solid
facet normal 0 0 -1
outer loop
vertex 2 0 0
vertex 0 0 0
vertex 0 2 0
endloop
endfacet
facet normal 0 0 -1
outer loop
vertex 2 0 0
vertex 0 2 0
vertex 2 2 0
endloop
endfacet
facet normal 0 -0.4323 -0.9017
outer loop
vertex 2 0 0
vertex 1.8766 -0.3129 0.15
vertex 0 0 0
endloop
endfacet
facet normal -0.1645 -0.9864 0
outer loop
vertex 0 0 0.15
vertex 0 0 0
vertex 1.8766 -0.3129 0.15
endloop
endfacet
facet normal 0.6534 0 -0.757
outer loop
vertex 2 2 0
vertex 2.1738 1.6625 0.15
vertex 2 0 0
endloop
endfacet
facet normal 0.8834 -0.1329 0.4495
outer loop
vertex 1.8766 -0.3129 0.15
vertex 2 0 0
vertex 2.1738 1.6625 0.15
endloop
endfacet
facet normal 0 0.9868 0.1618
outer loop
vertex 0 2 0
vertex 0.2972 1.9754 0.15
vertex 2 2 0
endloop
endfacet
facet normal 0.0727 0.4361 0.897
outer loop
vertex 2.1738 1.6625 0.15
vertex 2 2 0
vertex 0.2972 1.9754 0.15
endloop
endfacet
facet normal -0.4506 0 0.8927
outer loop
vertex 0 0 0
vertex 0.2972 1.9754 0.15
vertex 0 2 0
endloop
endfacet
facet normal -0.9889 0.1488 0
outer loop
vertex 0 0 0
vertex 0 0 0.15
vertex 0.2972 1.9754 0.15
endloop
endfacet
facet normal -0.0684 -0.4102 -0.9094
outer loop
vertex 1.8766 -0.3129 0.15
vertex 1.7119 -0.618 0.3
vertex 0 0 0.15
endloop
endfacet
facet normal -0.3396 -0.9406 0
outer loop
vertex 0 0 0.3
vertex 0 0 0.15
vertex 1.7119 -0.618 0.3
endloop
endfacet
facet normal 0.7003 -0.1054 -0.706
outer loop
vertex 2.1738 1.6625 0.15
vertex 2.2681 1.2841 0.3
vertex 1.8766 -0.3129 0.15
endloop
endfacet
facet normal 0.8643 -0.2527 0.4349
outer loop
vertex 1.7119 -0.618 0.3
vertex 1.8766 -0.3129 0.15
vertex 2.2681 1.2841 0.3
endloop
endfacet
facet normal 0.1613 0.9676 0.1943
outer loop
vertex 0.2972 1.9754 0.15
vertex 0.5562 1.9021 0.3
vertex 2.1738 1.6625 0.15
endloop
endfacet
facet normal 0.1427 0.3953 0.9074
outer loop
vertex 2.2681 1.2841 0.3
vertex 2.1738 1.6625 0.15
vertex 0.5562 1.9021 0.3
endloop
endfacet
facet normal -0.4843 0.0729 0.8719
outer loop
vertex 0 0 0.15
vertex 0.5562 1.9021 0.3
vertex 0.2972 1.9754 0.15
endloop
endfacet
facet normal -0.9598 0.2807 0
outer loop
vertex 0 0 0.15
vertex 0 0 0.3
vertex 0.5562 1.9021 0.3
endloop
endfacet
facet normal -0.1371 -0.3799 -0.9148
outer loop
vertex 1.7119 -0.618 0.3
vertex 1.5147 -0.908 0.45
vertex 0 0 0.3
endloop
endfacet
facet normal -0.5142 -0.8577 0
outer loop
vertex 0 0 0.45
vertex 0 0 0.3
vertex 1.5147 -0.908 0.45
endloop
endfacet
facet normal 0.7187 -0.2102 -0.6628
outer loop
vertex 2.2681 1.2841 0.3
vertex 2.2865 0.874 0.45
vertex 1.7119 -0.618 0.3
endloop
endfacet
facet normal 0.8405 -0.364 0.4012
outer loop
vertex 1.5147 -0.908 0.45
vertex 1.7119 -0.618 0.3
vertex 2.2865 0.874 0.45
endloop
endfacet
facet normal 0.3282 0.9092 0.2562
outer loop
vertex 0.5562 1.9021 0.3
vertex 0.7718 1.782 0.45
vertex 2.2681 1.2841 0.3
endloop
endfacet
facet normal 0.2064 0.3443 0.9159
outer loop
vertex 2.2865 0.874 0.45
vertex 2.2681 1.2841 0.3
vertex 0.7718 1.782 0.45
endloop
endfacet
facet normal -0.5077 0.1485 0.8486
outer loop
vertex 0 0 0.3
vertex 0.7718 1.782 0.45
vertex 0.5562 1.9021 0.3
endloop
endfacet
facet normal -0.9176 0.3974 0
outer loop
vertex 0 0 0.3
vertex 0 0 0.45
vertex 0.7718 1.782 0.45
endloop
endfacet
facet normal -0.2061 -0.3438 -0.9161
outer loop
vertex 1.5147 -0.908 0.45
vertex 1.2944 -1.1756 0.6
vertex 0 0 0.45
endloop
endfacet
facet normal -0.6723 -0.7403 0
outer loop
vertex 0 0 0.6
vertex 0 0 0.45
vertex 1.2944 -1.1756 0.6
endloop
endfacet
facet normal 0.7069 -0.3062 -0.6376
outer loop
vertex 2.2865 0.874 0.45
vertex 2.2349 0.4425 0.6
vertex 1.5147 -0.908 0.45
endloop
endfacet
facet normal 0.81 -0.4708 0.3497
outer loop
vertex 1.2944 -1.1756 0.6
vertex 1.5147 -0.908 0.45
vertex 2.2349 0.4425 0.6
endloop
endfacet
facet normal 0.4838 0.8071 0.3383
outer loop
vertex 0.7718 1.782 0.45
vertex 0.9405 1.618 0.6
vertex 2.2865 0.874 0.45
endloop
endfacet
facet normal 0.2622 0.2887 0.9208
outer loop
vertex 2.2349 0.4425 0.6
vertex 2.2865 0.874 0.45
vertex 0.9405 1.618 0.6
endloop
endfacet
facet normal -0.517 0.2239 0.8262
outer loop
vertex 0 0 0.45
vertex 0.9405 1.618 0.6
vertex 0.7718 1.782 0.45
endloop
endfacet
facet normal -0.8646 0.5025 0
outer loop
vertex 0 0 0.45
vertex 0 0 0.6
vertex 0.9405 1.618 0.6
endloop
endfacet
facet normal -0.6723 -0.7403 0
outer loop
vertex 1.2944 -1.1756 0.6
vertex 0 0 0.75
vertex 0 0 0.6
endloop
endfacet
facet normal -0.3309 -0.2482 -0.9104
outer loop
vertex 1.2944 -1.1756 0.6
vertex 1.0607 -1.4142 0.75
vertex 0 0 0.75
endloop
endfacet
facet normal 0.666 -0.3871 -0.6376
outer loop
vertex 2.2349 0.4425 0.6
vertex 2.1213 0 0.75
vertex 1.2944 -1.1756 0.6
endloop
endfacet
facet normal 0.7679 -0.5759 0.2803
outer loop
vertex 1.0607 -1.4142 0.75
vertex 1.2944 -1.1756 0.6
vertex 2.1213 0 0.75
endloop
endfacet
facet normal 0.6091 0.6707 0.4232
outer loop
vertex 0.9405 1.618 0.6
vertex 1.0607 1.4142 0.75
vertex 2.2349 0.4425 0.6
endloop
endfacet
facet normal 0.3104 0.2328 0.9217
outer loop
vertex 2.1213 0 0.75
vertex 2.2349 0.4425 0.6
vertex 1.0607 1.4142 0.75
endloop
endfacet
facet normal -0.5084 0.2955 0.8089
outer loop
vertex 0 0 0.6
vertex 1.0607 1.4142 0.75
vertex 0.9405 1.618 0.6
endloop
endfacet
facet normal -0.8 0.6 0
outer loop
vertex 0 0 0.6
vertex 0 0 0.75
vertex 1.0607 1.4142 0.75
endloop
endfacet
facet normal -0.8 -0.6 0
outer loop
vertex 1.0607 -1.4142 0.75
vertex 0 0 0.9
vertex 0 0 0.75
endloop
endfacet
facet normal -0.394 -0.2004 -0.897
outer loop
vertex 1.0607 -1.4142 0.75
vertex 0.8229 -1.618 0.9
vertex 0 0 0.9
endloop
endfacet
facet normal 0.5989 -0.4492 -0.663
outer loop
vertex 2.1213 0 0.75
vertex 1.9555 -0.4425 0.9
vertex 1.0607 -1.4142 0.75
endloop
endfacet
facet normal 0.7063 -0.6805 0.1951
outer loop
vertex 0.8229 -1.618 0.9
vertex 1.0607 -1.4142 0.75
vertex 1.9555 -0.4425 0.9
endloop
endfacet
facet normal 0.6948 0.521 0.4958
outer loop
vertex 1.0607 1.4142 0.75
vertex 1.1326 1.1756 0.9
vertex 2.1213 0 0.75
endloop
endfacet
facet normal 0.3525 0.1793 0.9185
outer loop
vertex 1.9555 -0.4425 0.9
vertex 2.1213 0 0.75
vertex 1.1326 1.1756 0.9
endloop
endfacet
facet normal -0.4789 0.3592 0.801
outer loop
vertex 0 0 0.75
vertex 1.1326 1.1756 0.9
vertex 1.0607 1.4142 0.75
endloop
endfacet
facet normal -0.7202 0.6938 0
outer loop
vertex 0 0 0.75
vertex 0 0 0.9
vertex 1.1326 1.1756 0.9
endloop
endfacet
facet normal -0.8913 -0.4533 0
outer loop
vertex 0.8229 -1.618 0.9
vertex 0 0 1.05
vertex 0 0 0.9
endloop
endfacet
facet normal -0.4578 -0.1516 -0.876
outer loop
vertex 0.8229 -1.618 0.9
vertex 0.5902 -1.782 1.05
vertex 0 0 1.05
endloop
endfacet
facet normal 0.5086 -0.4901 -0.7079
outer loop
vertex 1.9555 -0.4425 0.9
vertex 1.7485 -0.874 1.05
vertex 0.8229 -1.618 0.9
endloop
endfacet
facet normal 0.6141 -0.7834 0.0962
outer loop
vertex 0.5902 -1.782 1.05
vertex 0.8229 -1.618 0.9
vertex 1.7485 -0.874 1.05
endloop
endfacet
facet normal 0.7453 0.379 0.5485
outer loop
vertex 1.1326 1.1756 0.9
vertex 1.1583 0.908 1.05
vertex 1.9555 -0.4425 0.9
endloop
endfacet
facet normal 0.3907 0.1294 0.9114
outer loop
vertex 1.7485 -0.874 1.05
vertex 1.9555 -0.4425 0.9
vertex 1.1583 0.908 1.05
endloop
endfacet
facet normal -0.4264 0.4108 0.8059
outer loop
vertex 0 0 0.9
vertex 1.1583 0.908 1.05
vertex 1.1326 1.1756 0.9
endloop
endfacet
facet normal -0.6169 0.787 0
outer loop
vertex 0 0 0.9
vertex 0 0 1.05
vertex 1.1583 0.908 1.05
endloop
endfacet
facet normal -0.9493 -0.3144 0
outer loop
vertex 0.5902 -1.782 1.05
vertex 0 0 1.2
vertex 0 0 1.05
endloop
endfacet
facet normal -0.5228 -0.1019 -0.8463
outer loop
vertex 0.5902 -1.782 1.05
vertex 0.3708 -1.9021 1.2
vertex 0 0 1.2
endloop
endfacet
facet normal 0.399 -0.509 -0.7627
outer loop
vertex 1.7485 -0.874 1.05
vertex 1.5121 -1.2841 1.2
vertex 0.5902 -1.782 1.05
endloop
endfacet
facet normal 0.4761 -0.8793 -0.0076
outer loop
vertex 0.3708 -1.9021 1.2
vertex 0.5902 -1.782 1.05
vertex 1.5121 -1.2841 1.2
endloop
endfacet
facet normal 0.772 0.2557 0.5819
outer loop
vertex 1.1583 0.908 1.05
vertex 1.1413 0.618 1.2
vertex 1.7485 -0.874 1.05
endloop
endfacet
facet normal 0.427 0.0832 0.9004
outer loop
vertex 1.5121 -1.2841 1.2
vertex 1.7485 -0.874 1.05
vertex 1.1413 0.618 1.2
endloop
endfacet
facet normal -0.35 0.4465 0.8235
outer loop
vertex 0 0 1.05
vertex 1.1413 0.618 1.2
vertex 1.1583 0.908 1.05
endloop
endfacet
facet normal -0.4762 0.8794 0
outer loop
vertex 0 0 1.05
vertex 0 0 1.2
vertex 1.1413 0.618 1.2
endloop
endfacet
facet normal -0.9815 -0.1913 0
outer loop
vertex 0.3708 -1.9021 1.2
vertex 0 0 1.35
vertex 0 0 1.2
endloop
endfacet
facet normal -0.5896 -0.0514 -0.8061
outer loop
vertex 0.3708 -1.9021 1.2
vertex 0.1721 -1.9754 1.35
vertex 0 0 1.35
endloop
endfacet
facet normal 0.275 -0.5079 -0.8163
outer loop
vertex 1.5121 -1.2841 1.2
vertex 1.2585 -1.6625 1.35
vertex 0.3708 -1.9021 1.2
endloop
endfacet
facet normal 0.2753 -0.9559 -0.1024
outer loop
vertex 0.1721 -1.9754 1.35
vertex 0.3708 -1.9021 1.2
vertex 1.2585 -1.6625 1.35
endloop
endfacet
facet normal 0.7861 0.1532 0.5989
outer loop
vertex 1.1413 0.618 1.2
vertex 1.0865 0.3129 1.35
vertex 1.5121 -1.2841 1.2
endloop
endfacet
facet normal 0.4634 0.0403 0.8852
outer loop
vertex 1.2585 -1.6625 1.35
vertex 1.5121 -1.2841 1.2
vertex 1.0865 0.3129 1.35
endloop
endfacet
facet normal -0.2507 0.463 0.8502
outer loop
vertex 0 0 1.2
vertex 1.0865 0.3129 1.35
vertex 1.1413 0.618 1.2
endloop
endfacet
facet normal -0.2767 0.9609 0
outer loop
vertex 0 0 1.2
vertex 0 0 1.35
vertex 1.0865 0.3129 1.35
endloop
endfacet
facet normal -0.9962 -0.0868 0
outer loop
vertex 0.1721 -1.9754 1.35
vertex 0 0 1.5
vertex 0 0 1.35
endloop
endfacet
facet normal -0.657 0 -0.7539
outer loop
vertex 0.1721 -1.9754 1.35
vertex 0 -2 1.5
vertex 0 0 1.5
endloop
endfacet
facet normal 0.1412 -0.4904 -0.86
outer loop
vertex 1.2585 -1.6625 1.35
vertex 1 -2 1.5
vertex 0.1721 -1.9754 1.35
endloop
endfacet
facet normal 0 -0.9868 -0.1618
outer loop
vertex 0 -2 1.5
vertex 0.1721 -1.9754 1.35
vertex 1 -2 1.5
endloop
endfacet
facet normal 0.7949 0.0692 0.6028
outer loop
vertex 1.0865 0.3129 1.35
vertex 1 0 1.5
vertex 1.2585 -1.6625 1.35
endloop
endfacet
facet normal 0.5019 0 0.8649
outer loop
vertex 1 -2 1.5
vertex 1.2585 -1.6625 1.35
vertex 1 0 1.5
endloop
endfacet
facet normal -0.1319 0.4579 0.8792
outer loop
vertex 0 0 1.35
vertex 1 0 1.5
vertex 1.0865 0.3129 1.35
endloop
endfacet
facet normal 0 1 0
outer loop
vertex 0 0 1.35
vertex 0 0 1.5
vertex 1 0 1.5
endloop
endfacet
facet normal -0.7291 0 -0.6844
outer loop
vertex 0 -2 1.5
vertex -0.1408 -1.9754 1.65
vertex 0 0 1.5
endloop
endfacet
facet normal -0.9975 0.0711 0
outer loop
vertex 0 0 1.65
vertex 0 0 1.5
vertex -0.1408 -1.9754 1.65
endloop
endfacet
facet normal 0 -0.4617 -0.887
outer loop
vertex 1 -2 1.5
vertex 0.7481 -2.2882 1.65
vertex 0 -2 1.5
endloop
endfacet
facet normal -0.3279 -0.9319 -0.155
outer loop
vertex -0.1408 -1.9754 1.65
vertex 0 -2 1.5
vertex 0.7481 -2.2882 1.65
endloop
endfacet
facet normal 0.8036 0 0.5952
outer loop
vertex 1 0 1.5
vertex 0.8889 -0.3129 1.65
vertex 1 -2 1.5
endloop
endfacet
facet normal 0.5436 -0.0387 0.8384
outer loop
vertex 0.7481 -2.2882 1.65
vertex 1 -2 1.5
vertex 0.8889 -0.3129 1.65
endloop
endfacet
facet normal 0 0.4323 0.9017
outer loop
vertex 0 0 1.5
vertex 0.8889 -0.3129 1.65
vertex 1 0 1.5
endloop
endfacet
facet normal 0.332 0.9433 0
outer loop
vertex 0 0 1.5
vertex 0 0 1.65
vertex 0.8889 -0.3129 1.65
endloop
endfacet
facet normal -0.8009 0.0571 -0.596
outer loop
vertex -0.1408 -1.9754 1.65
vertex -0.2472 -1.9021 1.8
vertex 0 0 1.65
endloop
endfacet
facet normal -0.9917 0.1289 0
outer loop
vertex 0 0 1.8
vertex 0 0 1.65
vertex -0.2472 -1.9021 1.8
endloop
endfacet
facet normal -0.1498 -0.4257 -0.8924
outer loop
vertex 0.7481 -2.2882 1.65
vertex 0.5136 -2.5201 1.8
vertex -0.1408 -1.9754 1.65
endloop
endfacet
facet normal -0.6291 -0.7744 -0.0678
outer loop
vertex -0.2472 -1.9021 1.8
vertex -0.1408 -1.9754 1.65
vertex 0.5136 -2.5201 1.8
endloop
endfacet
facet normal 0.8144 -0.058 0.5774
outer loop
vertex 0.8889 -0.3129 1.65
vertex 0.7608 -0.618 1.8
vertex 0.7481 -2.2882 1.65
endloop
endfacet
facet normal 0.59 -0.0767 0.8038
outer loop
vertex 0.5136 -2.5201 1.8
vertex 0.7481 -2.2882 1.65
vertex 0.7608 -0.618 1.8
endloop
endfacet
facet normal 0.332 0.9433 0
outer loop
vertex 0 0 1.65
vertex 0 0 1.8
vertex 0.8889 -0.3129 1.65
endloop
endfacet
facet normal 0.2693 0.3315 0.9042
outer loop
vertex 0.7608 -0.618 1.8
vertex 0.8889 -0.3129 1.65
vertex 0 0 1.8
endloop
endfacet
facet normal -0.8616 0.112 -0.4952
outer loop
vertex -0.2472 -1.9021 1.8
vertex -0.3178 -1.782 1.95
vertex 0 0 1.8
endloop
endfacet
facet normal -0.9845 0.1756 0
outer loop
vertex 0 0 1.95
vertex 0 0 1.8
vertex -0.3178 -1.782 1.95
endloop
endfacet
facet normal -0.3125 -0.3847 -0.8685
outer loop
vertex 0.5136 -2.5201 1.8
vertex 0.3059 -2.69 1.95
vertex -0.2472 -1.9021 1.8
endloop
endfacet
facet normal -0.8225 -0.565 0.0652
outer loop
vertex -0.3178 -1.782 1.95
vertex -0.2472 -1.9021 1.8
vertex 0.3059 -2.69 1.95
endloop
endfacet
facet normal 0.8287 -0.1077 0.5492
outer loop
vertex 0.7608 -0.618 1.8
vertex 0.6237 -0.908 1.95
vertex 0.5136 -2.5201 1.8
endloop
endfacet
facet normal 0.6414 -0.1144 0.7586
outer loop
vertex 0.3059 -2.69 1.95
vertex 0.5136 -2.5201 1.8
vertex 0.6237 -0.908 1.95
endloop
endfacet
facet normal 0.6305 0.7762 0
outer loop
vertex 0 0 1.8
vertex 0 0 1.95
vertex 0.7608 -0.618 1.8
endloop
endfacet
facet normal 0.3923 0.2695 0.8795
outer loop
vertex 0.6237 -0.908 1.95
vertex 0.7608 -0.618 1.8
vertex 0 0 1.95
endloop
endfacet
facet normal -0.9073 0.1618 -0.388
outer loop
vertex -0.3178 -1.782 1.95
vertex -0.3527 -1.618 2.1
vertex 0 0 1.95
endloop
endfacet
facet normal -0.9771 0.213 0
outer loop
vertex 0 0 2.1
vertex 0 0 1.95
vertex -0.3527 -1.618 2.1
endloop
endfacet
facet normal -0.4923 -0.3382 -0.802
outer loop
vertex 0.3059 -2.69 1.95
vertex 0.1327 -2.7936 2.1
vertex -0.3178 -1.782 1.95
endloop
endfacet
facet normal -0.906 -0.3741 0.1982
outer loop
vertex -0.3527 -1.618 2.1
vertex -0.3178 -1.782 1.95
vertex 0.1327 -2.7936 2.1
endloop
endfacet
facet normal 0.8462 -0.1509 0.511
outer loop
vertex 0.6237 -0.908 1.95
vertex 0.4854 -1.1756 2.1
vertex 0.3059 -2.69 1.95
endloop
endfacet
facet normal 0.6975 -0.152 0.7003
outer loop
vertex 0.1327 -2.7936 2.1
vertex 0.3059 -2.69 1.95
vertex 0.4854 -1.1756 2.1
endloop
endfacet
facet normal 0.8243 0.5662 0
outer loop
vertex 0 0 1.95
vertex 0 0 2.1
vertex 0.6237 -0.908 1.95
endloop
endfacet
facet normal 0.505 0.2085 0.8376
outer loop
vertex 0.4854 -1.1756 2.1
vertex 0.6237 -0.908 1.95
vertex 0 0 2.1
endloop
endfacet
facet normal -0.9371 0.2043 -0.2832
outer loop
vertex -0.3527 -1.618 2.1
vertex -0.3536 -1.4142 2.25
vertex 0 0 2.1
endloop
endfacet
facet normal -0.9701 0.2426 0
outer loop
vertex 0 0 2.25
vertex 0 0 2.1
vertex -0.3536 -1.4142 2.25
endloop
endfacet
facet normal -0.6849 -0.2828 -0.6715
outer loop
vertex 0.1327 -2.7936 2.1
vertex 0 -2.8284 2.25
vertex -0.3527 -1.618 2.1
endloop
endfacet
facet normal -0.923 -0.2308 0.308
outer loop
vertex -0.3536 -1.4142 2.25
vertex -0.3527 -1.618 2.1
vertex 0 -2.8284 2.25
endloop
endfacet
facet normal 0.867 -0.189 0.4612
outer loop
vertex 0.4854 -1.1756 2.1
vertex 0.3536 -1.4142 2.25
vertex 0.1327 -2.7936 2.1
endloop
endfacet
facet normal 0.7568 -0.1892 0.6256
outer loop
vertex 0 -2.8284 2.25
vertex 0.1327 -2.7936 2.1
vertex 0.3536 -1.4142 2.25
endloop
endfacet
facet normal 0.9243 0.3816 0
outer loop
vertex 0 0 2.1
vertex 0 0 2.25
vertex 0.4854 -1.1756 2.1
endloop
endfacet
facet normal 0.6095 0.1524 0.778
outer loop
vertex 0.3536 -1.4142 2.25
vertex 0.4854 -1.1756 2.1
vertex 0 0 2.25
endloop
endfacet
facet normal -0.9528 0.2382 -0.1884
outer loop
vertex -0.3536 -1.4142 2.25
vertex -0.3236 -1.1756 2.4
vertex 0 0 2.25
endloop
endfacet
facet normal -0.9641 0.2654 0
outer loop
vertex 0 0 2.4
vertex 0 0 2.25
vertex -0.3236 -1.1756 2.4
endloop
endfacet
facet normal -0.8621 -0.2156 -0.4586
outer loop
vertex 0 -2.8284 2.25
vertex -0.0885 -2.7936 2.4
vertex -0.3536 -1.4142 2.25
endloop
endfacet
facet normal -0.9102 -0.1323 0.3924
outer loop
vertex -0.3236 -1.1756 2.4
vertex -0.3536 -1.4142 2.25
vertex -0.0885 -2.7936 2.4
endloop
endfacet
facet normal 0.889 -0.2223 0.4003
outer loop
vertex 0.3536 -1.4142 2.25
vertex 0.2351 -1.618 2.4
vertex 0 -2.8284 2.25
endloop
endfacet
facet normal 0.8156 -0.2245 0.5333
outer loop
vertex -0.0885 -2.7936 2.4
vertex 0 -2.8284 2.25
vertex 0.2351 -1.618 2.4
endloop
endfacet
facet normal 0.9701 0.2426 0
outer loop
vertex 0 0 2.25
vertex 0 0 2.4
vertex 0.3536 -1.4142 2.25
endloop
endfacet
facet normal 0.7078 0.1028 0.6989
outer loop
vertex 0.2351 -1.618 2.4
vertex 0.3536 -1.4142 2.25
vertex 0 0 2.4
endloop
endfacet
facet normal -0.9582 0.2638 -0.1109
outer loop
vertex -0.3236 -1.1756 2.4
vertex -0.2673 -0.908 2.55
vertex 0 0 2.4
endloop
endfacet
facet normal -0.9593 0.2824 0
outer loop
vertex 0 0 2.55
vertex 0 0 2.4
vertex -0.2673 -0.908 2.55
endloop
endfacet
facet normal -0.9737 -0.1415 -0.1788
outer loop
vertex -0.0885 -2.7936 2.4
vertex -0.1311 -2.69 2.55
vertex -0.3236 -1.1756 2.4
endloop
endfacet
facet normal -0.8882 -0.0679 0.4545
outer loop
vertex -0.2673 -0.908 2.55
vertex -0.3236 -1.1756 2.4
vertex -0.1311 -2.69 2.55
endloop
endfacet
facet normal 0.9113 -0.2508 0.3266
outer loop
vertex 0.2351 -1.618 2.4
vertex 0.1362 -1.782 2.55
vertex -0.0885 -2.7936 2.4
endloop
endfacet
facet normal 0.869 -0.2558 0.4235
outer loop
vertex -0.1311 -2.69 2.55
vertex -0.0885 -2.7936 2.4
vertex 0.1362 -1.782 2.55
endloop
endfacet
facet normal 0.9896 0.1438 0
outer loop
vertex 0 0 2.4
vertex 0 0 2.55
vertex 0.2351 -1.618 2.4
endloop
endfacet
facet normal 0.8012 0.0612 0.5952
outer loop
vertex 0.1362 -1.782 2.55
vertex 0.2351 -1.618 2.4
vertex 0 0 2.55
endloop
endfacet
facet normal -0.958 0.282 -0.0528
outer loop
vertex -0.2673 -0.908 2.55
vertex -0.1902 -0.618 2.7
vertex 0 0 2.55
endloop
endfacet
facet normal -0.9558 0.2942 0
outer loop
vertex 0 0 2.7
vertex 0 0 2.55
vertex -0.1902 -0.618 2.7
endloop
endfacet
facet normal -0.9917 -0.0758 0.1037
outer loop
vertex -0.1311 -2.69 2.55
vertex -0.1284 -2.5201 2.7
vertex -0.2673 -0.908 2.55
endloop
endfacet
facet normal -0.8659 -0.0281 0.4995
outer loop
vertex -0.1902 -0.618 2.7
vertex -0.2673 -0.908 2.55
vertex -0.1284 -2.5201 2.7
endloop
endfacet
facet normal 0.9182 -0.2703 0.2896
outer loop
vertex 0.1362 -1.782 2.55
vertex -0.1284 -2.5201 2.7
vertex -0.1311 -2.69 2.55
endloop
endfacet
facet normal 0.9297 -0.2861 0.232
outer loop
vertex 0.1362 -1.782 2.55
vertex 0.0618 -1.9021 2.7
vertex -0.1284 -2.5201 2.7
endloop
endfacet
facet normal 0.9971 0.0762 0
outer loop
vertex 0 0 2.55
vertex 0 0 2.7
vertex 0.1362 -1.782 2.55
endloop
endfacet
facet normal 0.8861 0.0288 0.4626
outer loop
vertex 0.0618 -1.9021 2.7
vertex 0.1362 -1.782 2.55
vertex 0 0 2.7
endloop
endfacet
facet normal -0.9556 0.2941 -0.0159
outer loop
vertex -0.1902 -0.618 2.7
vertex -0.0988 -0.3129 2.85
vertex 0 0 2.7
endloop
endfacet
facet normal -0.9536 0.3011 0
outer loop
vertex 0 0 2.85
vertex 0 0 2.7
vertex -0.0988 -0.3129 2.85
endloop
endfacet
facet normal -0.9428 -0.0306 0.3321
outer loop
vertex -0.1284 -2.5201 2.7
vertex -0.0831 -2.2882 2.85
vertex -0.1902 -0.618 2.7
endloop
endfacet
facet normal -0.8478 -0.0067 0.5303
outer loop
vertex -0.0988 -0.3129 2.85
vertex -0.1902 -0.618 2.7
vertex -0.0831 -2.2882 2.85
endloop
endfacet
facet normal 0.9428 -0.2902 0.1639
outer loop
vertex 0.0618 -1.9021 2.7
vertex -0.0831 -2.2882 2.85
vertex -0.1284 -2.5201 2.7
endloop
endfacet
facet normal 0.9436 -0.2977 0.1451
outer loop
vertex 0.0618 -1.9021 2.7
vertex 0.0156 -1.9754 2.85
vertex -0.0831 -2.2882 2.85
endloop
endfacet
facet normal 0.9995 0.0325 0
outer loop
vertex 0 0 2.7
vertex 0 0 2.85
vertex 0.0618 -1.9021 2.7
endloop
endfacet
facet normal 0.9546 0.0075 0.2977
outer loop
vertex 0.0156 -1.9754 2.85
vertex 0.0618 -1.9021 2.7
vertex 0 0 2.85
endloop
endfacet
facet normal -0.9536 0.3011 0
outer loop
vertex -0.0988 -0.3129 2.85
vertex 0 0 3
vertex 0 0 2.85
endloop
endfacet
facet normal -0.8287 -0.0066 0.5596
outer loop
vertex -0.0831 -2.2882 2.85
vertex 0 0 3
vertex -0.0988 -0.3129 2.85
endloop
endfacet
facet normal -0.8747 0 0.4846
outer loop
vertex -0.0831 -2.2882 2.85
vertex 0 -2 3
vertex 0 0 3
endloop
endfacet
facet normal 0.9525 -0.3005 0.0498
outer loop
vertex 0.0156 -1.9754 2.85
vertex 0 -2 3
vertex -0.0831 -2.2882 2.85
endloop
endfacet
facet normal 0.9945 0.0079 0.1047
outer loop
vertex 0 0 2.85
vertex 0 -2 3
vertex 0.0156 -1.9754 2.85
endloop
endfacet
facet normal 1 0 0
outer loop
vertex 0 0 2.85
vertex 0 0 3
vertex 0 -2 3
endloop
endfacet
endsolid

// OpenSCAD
// SYMPTOM: a twisted linear_extrude whose top collapses to a LINE (exactly one
//   zero scale component) imported as a NULL shape for some twist angles --
//   e.g. twist=180, scale=[0,1] square([2,2]). Asymmetric: scale=[1,0]+twist180
//   and scale=[0,1]+twist90 both built fine. The twist=180 [0,1] null was the
//   remaining contributor to t3d__linear_extrude-scale-zero-tests (single-wire
//   variants). (A5 had fixed only the both-zero POINT collapse with twist.)
// CAUSE: OpenSCADFeatures.Twist.execute. The general path sweeps the profile
//   with MakePipeShell + an auxiliary helix; for some twisted line collapses
//   pipe_shell.isReady()/build() raise, and the face loop aborted before
//   fp.Shape was set -> null.
// FIX: OpenSCADFeatures.py Twist.execute -> build the sweep defensively; when it
//   RAISES (only then) and the profile is a single-wire one-zero (line) twisted
//   case, fall back to _twisted_taper_solid, which lofts through the
//   rotated+scaled cross-sections (one slice per ~9 deg of twist). The success
//   path and the Shell/Solid OCCError->Compound fallback are unchanged, so the
//   many working twist cases are untouched. A holed/multi-wire twisted
//   taper-to-line self-intersects and has no clean OCC solid -> left empty
//   (not forced into an invalid shape that would poison unions). Commit e3b64af870.
// EXPECTED (OpenSCAD): twist preserves cross-sectional area, so the smooth wedge
//   volume is base*h/2 = 2*2*3/2 = 6. OpenSCAD's 20-slice render is 6.106 and
//   the discretized loft slightly overshoots (~6.4) -- faceting-class; the point
//   is the geometry is a valid solid, no longer dropped to null.
linear_extrude(height = 3, twist = 180, slices = 20, scale = [0, 1])
	square([2, 2]);
